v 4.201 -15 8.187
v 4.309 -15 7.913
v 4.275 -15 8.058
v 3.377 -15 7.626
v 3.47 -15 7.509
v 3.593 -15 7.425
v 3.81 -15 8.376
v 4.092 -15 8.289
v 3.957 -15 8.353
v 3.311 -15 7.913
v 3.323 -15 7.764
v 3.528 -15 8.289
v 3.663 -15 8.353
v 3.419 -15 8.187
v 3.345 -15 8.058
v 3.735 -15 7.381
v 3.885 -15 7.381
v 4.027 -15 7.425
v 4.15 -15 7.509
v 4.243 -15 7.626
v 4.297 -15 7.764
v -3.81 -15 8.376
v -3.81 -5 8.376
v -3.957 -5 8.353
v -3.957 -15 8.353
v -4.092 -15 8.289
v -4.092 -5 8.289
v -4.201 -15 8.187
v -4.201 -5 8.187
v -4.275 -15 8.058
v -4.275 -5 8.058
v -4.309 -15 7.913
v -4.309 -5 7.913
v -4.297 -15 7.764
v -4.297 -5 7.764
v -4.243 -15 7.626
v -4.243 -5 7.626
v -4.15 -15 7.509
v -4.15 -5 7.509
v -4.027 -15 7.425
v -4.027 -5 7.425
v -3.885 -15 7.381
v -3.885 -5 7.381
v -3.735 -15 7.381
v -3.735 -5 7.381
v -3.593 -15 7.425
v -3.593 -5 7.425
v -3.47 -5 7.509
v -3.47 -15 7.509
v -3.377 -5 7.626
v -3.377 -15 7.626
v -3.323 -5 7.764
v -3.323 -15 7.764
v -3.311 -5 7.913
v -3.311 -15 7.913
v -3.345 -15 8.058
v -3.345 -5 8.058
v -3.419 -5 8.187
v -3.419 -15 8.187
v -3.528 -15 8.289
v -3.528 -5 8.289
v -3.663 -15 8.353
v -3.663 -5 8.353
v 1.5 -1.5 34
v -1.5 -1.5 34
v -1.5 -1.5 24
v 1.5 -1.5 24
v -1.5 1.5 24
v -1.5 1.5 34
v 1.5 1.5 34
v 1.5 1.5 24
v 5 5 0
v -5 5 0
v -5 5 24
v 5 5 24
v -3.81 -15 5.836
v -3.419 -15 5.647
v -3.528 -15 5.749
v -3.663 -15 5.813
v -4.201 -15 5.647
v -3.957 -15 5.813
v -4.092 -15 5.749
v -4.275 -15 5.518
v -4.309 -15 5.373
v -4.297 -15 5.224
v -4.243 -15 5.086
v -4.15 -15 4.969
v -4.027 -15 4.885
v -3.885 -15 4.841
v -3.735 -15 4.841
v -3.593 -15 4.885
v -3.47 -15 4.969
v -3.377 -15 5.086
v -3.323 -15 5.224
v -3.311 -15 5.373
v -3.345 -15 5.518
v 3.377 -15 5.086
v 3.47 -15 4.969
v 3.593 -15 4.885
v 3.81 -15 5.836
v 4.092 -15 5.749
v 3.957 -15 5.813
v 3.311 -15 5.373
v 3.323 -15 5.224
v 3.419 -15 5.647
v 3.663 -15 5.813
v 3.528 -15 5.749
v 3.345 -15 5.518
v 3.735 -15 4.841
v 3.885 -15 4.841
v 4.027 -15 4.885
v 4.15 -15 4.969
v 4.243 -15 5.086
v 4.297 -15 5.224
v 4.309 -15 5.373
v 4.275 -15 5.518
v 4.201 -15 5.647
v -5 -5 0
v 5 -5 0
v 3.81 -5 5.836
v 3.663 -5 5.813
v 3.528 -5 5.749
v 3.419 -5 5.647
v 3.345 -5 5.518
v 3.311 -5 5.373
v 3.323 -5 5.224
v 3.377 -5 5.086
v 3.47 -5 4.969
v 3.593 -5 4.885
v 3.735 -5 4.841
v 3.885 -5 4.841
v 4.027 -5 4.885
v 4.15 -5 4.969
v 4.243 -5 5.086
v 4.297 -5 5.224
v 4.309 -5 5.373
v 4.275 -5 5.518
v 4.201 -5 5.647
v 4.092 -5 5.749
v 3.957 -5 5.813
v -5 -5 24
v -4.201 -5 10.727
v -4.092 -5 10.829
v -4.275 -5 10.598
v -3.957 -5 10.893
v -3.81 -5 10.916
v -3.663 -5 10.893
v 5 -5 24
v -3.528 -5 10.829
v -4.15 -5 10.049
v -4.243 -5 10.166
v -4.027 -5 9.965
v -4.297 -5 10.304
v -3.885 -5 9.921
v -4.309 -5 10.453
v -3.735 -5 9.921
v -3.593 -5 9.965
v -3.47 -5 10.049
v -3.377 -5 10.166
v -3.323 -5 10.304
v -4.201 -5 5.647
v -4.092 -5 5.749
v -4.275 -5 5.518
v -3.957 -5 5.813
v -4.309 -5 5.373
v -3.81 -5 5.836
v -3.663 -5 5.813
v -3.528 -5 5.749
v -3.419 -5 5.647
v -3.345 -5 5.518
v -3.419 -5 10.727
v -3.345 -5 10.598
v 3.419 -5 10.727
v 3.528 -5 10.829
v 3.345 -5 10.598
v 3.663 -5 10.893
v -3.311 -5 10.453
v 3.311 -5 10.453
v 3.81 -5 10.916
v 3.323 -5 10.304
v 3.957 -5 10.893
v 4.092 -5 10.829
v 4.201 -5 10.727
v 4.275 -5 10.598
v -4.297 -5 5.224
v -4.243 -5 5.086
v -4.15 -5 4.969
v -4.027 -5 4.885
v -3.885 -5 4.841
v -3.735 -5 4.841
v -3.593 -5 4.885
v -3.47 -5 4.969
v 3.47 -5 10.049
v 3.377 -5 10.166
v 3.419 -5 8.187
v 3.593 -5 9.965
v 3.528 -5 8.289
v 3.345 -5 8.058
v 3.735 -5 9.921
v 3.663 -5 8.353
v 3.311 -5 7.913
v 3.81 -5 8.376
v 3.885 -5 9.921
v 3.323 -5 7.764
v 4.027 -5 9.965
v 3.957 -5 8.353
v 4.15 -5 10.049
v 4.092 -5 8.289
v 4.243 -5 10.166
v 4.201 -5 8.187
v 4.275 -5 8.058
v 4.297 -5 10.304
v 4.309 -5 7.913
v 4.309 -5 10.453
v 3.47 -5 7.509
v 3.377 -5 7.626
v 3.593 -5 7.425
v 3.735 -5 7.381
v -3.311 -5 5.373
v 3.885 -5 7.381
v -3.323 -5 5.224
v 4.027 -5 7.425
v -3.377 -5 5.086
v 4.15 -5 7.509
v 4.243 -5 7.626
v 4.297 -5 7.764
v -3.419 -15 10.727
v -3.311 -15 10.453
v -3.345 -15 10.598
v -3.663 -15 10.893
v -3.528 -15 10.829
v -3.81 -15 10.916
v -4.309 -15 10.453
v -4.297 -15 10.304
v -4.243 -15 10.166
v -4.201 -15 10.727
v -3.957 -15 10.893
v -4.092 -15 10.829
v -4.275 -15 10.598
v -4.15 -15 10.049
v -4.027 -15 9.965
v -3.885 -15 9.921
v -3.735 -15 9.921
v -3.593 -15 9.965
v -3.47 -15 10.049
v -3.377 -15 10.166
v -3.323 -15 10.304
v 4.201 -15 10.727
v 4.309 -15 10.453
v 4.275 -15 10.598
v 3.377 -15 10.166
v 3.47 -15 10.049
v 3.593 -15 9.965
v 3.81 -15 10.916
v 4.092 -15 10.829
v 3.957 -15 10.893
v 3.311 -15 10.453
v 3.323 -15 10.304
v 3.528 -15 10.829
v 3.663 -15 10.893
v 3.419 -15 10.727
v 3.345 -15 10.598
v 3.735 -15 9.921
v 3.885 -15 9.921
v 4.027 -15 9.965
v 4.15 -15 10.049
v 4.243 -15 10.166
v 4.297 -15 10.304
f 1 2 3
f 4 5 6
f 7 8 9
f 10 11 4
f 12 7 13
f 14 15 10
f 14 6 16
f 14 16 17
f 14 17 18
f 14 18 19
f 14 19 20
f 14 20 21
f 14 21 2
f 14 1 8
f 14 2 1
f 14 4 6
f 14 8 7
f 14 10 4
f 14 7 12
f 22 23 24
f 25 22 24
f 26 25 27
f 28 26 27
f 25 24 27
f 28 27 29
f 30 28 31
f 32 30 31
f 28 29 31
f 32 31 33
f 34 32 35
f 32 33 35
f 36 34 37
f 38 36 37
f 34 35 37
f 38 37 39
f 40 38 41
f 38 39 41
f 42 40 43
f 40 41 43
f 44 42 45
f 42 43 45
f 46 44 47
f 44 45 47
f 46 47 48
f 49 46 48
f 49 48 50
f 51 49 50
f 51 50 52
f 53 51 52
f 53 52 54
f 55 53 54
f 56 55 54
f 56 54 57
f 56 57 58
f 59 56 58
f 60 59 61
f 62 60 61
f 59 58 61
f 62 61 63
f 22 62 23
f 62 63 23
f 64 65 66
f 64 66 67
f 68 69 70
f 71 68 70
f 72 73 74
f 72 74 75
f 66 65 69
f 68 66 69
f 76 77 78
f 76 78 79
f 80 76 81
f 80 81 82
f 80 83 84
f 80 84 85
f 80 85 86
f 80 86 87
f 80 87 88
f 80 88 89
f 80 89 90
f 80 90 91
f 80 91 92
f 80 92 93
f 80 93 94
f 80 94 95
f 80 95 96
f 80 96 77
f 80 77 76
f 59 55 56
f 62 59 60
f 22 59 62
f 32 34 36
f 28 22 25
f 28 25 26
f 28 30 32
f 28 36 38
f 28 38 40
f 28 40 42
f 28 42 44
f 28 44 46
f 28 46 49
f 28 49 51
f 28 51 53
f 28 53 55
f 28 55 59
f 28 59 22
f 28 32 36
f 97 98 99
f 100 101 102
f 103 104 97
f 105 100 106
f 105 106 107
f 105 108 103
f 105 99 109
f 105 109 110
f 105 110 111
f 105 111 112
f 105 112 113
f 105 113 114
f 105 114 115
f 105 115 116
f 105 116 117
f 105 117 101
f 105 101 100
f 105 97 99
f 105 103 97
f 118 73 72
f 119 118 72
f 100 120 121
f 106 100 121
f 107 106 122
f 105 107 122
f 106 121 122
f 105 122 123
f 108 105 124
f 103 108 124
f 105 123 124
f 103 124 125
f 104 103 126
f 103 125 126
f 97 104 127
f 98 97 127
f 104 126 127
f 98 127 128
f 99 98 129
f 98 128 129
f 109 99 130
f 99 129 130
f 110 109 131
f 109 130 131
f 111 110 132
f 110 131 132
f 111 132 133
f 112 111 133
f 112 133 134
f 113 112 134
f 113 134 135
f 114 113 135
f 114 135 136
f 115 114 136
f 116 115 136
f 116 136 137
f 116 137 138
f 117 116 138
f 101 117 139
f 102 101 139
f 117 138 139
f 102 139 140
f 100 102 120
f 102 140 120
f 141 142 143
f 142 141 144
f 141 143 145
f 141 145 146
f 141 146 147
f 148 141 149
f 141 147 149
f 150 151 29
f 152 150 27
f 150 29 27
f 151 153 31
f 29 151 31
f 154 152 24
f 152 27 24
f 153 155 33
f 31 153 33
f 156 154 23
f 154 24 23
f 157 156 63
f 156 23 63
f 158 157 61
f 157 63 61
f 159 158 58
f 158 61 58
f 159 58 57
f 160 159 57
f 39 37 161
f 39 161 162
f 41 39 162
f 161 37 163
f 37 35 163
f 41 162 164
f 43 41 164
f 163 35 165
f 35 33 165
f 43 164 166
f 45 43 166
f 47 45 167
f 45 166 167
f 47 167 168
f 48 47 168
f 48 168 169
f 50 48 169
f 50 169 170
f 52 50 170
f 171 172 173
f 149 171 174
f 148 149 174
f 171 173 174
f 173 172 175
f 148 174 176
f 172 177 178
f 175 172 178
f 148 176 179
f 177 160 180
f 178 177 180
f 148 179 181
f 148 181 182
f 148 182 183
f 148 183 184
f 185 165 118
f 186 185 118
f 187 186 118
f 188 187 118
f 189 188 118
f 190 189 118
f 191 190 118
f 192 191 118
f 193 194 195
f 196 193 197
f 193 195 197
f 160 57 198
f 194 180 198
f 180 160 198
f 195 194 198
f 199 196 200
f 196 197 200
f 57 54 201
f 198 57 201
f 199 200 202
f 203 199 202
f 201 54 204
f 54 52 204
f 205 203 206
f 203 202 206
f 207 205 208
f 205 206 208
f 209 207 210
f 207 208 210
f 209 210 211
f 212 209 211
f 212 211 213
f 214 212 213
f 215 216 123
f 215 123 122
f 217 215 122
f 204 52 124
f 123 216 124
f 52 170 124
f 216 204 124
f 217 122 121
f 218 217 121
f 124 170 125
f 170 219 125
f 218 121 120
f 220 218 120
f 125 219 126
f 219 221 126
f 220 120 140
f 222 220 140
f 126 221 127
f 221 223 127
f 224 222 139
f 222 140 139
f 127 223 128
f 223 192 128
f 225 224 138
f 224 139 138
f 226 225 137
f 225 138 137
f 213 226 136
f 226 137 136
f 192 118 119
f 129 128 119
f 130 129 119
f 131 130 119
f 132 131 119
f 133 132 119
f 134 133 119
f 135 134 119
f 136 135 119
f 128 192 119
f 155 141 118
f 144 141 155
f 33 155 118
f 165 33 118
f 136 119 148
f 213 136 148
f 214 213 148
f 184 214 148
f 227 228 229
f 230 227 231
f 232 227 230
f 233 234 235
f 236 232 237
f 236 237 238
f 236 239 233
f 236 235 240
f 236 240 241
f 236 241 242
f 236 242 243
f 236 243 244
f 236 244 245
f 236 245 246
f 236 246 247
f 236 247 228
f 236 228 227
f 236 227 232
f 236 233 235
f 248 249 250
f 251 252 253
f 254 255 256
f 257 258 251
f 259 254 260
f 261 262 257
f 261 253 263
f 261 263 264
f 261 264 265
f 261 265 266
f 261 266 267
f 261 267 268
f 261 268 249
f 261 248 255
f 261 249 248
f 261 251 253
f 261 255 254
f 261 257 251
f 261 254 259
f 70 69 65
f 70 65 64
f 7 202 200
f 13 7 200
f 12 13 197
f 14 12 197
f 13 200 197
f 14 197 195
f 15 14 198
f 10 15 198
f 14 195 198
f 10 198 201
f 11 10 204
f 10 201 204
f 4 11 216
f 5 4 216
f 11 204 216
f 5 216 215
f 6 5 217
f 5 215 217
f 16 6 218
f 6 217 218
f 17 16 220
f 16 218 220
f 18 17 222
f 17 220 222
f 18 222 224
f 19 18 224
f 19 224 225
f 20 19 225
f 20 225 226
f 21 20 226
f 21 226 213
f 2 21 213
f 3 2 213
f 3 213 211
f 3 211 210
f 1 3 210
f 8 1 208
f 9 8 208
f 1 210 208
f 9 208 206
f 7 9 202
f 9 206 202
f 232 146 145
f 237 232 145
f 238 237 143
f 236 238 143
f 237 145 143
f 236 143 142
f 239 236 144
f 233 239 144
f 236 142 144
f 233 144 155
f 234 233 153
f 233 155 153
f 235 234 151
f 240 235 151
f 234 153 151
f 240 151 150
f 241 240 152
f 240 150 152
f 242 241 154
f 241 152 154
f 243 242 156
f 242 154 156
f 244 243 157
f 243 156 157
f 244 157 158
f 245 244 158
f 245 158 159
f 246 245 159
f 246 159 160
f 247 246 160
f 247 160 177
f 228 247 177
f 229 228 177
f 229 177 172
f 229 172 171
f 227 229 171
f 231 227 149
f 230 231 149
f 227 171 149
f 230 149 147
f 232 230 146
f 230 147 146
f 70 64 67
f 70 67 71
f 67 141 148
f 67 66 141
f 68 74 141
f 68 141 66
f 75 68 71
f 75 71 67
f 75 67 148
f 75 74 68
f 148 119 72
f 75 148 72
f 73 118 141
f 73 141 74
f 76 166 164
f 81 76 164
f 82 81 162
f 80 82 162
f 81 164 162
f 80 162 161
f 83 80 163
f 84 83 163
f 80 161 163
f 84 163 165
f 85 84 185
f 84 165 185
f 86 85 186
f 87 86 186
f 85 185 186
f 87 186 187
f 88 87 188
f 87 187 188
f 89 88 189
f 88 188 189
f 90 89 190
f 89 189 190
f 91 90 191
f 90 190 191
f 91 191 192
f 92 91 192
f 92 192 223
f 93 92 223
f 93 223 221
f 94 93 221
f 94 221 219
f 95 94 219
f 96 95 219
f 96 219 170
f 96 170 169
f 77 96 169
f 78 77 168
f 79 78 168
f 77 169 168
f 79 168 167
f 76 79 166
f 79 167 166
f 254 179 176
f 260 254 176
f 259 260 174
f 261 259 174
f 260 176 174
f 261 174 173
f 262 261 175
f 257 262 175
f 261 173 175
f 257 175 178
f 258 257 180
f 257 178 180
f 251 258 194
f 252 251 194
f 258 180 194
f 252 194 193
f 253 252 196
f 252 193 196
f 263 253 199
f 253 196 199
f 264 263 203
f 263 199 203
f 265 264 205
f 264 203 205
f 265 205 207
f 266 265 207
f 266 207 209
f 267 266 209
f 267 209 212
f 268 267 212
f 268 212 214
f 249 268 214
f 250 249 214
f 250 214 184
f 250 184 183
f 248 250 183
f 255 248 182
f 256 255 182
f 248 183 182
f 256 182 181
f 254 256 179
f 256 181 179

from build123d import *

# Parameters (mm, degrees)
SKETCH1_W           = 10
SKETCH1_H           = 10
BOSS_EXTRUDE1_DEPTH = 24
SKETCH2_W           = 3
SKETCH2_H           = 3
BOSS_EXTRUDE2_DEPTH = 10
SKETCH3_R           = 0.5
BOSS_EXTRUDE3_DEPTH = 10


with BuildPart() as part:
    # Sketch1 → Boss-Extrude1 (new body)
    with BuildSketch(Plane.XY):
        Rectangle(SKETCH1_W, SKETCH1_H)
    extrude(amount=BOSS_EXTRUDE1_DEPTH)

    # Sketch2 → Boss-Extrude2 (add)
    with BuildSketch(Plane.XY.offset(24)):
        Rectangle(SKETCH2_W, SKETCH2_H)
    extrude(amount=BOSS_EXTRUDE2_DEPTH)

    # Sketch3 → Boss-Extrude3 (add)
    with BuildSketch(Plane.XZ.offset(5)):
        with Locations(Location((-3.81, 10.415606067, 0), (0, 0, 90))):
            Circle(SKETCH3_R)
        with Locations(Location((3.81, 10.415606067, 0), (0, 0, 90))):
            Circle(SKETCH3_R)
        with Locations(Location((3.81, 7.875606067, 0), (0, 0, 90))):
            Circle(SKETCH3_R)
        with Locations(Location((3.81, 5.335606067, 0), (0, 0, 90))):
            Circle(SKETCH3_R)
        with Locations(Location((-3.81, 7.875606067, 0), (0, 0, 90))):
            Circle(SKETCH3_R)
        with Locations(Location((-3.81, 5.335606067, 0), (0, 0, 90))):
            Circle(SKETCH3_R)
    extrude(amount=BOSS_EXTRUDE3_DEPTH)


solid = part.part
